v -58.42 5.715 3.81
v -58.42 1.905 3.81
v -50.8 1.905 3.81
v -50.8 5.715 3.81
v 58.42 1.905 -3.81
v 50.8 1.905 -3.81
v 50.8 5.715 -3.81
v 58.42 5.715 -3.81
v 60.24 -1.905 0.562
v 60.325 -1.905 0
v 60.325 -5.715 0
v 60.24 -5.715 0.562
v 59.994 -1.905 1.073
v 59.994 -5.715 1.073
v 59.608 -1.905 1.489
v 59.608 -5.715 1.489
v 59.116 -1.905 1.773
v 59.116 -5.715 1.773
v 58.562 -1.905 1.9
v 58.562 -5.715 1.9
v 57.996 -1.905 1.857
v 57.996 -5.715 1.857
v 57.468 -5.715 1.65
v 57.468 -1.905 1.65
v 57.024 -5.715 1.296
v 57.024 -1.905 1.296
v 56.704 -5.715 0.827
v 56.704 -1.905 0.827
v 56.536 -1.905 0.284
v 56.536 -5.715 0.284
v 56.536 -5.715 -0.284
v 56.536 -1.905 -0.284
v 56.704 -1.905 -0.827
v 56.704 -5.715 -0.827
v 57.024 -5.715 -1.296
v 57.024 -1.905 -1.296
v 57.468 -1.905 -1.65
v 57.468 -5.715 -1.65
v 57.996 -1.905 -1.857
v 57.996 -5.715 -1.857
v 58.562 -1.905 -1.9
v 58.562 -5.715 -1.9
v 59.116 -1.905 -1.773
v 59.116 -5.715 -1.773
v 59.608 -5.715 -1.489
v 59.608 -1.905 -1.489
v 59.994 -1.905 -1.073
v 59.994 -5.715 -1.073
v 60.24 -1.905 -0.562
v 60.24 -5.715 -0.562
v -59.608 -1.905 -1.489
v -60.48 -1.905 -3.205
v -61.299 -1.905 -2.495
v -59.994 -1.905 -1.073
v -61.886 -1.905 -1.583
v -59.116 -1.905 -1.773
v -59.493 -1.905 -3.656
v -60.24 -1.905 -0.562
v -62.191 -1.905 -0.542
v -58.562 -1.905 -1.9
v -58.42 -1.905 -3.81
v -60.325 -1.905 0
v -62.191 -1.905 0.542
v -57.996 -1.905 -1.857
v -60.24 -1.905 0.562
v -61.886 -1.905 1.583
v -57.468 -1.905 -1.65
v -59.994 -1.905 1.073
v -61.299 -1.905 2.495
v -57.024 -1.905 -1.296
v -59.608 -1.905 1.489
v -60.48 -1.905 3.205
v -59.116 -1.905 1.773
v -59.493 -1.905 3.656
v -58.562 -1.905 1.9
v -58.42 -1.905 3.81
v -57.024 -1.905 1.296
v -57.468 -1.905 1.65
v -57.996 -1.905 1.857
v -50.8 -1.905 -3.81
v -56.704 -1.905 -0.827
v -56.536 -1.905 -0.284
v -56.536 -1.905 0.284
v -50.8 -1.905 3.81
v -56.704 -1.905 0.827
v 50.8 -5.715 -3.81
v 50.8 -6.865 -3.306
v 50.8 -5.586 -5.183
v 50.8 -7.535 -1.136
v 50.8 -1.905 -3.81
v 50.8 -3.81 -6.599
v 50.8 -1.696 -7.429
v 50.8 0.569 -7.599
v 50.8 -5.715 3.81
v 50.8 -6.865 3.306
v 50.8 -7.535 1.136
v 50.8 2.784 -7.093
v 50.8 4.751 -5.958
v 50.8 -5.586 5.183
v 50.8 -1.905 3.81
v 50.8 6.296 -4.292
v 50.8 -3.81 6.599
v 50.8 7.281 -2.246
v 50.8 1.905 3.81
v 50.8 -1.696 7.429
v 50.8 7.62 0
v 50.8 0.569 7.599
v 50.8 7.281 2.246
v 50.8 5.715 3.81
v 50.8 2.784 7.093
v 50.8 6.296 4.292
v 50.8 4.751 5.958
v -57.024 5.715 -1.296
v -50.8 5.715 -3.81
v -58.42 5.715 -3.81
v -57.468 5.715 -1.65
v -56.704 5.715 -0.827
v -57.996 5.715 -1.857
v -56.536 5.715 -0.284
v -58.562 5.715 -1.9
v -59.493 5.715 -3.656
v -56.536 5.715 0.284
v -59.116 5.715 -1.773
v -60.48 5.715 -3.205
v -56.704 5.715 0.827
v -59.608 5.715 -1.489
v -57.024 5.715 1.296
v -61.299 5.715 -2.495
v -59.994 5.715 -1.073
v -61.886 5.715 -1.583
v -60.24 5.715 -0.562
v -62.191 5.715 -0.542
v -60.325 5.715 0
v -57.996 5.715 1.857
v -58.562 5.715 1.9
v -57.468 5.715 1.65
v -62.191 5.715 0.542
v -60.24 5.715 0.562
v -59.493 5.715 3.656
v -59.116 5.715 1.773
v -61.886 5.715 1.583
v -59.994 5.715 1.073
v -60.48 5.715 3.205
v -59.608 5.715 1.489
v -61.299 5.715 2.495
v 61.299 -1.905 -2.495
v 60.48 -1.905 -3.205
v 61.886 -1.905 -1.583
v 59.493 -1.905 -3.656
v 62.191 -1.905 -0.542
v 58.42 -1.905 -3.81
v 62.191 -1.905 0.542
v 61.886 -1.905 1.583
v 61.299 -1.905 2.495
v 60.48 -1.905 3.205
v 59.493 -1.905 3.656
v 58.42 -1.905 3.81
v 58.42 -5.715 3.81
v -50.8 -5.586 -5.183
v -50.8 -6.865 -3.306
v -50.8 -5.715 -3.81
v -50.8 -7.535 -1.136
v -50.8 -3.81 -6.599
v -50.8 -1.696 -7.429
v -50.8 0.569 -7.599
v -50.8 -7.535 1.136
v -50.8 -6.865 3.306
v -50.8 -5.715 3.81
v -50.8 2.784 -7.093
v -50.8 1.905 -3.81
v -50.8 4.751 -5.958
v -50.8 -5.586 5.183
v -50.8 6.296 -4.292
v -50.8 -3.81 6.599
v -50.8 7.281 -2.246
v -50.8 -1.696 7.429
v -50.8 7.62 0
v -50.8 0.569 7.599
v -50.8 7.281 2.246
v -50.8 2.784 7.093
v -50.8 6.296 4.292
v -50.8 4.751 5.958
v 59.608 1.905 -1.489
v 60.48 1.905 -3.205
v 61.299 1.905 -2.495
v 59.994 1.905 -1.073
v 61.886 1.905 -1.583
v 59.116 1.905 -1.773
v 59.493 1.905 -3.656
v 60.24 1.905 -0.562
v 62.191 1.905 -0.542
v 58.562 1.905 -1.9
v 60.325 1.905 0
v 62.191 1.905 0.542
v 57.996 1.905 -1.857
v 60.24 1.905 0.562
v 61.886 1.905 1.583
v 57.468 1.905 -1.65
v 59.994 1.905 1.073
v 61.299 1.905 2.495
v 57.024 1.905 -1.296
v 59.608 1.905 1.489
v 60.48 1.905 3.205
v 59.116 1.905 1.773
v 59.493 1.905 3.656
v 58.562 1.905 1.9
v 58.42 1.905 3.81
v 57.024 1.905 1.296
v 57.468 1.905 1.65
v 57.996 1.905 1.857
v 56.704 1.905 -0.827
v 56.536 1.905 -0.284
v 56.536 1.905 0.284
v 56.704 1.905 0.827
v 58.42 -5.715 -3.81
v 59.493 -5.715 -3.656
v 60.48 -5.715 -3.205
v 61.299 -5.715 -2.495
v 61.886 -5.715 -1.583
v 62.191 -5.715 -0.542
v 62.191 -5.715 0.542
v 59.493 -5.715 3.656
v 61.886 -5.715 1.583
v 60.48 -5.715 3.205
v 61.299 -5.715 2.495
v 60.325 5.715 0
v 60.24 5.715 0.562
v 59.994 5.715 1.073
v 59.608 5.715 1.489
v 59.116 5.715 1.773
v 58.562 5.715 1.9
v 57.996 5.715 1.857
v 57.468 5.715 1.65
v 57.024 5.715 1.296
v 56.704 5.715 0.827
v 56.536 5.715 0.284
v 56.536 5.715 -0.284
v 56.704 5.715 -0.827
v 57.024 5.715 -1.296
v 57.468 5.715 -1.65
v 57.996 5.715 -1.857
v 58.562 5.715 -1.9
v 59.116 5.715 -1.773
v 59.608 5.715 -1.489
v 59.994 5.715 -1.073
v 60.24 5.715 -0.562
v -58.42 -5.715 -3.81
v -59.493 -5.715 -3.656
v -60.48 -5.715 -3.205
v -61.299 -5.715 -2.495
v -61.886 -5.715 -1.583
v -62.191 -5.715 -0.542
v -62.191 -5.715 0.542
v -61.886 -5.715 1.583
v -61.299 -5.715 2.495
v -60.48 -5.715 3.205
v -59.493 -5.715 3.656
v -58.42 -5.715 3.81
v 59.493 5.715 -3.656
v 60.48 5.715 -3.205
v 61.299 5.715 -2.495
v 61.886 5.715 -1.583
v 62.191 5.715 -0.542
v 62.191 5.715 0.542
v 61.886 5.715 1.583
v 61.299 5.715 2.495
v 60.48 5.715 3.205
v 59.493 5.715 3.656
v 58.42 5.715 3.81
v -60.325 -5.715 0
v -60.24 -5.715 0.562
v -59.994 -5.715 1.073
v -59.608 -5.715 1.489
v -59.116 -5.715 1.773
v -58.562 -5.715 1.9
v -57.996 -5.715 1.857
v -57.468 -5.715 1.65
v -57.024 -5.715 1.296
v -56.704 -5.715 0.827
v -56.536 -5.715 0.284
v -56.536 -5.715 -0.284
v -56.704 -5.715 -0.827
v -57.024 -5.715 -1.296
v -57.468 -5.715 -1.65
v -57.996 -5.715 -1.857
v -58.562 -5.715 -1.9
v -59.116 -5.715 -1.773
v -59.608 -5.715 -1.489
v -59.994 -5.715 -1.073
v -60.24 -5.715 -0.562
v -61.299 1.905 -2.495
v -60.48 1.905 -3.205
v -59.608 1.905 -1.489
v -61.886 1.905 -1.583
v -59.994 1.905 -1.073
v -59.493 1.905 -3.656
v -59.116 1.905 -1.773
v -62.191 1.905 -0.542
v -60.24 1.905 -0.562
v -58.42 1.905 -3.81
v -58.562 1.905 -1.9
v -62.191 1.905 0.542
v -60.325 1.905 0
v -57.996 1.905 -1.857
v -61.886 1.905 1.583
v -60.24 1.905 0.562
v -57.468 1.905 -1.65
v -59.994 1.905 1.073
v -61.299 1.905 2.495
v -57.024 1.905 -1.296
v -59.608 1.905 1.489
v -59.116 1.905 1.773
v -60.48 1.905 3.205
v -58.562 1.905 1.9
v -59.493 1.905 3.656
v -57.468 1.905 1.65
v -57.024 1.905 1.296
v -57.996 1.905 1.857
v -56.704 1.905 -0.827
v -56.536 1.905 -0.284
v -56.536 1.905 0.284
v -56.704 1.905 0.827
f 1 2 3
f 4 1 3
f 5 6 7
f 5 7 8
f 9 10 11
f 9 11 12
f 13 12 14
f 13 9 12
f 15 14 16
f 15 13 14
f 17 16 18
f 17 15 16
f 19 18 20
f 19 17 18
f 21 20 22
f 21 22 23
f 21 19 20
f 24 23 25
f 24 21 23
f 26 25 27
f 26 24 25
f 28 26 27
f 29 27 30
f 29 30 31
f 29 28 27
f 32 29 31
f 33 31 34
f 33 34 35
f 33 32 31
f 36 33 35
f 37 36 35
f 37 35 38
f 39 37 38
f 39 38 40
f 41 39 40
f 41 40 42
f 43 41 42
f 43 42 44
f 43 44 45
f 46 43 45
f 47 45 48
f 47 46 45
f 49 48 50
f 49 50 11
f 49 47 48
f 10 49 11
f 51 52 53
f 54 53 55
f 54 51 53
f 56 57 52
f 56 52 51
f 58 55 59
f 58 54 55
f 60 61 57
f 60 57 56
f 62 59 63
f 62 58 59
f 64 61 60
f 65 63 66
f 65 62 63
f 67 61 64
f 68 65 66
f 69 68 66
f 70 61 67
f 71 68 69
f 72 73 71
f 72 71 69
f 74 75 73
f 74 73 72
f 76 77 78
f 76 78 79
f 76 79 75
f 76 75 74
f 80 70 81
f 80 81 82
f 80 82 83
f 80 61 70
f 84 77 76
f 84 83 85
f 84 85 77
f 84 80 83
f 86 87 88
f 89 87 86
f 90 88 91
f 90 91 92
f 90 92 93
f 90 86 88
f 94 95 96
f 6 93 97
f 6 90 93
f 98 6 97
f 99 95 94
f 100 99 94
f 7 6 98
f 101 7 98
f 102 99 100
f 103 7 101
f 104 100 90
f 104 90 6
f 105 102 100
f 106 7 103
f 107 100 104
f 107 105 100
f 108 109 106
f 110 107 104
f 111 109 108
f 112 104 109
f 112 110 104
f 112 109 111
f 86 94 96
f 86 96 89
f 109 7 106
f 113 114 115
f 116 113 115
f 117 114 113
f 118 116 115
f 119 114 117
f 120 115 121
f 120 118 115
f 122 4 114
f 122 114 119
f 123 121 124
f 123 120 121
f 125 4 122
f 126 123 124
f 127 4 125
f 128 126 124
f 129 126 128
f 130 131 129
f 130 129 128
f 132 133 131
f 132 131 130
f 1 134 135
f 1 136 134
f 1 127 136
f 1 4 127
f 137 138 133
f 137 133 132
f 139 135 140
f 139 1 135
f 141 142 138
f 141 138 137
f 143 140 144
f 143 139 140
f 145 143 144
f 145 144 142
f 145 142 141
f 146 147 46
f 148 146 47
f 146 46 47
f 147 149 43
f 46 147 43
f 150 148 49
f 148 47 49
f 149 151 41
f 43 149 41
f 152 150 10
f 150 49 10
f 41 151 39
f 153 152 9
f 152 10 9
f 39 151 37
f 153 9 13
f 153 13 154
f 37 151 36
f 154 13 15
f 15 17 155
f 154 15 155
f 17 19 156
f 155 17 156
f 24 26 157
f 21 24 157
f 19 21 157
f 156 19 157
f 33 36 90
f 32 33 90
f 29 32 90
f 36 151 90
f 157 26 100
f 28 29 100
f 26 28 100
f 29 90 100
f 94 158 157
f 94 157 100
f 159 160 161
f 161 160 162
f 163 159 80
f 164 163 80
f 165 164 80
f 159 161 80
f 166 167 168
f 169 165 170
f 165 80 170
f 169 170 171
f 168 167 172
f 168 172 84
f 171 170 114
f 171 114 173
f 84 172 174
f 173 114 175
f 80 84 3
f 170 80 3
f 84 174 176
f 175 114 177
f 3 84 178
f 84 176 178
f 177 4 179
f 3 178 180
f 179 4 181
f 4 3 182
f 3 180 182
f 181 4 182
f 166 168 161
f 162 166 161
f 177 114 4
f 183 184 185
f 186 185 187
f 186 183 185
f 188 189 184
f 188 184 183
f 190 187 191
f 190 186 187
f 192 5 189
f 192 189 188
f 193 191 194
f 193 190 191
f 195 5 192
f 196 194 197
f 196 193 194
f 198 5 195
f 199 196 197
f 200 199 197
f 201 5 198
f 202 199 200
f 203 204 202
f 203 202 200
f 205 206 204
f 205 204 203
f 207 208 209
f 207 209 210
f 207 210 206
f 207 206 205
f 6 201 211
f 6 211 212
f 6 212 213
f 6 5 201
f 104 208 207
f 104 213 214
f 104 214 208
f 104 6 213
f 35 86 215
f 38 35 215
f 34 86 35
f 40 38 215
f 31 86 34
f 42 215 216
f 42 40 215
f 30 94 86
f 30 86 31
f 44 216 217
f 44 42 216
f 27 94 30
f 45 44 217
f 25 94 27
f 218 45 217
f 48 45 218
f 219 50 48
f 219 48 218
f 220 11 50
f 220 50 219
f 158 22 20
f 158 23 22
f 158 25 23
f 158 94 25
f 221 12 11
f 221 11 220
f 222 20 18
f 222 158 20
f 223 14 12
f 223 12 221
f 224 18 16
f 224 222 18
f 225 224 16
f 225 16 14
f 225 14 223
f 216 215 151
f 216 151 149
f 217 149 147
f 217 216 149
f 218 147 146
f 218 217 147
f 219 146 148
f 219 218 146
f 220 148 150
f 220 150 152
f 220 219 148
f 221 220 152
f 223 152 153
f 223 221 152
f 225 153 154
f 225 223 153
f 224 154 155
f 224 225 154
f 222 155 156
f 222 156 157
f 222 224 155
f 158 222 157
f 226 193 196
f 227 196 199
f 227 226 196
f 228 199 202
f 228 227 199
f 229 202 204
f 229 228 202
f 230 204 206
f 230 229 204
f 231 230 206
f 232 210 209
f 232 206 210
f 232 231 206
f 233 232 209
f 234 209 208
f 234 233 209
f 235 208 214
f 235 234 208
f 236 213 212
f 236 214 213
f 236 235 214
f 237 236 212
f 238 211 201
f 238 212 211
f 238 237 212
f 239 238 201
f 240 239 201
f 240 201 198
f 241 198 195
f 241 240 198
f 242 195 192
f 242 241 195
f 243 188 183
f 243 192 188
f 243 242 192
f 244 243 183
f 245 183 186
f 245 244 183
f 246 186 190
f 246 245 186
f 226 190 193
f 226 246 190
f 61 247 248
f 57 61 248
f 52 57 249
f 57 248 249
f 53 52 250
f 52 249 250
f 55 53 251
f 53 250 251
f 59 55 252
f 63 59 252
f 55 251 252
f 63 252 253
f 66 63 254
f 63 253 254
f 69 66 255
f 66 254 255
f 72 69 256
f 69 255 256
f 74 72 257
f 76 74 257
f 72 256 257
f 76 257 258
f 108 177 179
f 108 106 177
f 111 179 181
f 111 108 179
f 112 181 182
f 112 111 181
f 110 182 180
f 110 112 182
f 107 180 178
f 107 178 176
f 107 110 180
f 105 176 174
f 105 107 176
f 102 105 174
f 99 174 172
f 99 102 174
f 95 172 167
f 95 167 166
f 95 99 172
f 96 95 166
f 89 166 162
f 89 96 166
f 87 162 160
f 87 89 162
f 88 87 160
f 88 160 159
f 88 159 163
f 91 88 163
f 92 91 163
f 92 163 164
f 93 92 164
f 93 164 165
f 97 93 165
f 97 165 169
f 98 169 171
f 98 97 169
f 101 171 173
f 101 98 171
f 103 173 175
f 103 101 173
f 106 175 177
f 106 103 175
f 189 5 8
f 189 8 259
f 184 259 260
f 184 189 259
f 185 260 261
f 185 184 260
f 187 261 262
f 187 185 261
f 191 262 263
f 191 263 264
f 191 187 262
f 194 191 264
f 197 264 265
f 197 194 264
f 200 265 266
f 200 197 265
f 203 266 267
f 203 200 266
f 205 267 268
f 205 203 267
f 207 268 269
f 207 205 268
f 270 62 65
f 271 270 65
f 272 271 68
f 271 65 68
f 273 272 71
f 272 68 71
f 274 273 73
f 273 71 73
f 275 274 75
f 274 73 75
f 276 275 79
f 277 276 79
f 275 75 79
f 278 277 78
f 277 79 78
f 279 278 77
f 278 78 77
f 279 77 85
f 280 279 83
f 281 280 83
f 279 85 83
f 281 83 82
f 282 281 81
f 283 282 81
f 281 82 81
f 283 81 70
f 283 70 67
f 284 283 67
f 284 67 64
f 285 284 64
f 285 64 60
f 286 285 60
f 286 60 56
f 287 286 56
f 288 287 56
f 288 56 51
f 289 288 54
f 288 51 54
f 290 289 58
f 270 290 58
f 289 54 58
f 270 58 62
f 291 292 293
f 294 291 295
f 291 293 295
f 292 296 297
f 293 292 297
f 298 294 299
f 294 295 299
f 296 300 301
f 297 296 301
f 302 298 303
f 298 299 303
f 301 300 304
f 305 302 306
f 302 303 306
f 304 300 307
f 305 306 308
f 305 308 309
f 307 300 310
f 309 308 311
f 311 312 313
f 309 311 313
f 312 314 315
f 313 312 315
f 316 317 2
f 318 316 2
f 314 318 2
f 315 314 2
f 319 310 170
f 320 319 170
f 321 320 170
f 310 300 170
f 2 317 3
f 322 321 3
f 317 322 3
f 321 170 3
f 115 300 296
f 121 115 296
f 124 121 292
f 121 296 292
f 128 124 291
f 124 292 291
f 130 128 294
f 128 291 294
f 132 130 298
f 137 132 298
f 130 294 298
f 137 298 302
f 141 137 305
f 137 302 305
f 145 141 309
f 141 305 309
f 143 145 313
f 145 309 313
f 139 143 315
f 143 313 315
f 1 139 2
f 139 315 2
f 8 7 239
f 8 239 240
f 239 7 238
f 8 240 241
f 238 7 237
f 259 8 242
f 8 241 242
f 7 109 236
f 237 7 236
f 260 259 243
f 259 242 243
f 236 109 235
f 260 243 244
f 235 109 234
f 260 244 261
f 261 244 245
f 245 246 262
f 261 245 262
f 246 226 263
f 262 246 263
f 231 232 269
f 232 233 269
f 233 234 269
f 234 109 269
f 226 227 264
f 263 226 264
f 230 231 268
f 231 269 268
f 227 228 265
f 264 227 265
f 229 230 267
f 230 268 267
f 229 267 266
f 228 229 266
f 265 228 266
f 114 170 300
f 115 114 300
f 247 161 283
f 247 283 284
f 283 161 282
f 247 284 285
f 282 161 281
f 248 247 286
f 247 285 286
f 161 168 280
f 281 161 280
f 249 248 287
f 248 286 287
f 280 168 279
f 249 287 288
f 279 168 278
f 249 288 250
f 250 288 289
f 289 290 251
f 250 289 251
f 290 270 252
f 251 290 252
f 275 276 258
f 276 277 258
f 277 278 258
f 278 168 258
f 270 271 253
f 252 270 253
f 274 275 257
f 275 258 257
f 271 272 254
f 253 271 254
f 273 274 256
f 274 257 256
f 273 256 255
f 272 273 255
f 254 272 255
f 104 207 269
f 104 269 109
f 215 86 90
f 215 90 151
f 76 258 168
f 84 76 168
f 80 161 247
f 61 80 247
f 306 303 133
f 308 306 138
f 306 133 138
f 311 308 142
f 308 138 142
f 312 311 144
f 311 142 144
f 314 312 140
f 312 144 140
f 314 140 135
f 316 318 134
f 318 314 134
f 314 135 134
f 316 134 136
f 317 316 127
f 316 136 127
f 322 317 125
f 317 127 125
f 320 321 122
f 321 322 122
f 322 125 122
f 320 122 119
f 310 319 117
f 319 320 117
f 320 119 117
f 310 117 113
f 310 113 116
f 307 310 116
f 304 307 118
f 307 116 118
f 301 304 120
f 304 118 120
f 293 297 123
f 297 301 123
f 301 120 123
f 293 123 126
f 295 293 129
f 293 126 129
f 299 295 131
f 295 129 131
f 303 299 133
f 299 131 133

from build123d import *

# Parameters (mm, degrees)
F0_R     = 7.62
F1_DEPTH = 50.8
F2_R     = 1.905
F3_DEPTH = 5.715
F4_W     = 3.81
F4_H     = 7.62
F5_DEPTH = 11.431


with BuildPart() as f1:
    # F0 (on Right) → F1 (new body, symmetric)
    with BuildSketch(Plane.YZ):
        Circle(F0_R)
    extrude(amount=F1_DEPTH, both=True)

    # F2 (on Front) → F3 (join, symmetric)
    with BuildSketch(Plane.XZ):
        with BuildLine():
            Line((50.8, 3.81), (50.8, 0))
            Line((50.8, 0), (50.8, -3.81))
            Line((50.8, -3.81), (58.42, -3.81))
            ThreePointArc((58.42, -3.81), (62.23, 0), (58.42, 3.81))
            Line((58.42, 3.81), (50.8, 3.81))
        make_face()
        with Locations((58.42, 0)):
            Circle(F2_R, mode=Mode.SUBTRACT)
    extrude(amount=F3_DEPTH, both=True)

    # F4 (on face) → F5 (cut, through all)
    with BuildSketch(Plane.YZ.offset(50.8)):
        Rectangle(F4_W, F4_H)
    extrude(amount=F5_DEPTH, mode=Mode.SUBTRACT)

    # F6: F1 across plane


with BuildPart() as f1_1:
    add(f1.part)
    add(f1.part.mirror(Plane.YZ))


solid = f1_1.part
